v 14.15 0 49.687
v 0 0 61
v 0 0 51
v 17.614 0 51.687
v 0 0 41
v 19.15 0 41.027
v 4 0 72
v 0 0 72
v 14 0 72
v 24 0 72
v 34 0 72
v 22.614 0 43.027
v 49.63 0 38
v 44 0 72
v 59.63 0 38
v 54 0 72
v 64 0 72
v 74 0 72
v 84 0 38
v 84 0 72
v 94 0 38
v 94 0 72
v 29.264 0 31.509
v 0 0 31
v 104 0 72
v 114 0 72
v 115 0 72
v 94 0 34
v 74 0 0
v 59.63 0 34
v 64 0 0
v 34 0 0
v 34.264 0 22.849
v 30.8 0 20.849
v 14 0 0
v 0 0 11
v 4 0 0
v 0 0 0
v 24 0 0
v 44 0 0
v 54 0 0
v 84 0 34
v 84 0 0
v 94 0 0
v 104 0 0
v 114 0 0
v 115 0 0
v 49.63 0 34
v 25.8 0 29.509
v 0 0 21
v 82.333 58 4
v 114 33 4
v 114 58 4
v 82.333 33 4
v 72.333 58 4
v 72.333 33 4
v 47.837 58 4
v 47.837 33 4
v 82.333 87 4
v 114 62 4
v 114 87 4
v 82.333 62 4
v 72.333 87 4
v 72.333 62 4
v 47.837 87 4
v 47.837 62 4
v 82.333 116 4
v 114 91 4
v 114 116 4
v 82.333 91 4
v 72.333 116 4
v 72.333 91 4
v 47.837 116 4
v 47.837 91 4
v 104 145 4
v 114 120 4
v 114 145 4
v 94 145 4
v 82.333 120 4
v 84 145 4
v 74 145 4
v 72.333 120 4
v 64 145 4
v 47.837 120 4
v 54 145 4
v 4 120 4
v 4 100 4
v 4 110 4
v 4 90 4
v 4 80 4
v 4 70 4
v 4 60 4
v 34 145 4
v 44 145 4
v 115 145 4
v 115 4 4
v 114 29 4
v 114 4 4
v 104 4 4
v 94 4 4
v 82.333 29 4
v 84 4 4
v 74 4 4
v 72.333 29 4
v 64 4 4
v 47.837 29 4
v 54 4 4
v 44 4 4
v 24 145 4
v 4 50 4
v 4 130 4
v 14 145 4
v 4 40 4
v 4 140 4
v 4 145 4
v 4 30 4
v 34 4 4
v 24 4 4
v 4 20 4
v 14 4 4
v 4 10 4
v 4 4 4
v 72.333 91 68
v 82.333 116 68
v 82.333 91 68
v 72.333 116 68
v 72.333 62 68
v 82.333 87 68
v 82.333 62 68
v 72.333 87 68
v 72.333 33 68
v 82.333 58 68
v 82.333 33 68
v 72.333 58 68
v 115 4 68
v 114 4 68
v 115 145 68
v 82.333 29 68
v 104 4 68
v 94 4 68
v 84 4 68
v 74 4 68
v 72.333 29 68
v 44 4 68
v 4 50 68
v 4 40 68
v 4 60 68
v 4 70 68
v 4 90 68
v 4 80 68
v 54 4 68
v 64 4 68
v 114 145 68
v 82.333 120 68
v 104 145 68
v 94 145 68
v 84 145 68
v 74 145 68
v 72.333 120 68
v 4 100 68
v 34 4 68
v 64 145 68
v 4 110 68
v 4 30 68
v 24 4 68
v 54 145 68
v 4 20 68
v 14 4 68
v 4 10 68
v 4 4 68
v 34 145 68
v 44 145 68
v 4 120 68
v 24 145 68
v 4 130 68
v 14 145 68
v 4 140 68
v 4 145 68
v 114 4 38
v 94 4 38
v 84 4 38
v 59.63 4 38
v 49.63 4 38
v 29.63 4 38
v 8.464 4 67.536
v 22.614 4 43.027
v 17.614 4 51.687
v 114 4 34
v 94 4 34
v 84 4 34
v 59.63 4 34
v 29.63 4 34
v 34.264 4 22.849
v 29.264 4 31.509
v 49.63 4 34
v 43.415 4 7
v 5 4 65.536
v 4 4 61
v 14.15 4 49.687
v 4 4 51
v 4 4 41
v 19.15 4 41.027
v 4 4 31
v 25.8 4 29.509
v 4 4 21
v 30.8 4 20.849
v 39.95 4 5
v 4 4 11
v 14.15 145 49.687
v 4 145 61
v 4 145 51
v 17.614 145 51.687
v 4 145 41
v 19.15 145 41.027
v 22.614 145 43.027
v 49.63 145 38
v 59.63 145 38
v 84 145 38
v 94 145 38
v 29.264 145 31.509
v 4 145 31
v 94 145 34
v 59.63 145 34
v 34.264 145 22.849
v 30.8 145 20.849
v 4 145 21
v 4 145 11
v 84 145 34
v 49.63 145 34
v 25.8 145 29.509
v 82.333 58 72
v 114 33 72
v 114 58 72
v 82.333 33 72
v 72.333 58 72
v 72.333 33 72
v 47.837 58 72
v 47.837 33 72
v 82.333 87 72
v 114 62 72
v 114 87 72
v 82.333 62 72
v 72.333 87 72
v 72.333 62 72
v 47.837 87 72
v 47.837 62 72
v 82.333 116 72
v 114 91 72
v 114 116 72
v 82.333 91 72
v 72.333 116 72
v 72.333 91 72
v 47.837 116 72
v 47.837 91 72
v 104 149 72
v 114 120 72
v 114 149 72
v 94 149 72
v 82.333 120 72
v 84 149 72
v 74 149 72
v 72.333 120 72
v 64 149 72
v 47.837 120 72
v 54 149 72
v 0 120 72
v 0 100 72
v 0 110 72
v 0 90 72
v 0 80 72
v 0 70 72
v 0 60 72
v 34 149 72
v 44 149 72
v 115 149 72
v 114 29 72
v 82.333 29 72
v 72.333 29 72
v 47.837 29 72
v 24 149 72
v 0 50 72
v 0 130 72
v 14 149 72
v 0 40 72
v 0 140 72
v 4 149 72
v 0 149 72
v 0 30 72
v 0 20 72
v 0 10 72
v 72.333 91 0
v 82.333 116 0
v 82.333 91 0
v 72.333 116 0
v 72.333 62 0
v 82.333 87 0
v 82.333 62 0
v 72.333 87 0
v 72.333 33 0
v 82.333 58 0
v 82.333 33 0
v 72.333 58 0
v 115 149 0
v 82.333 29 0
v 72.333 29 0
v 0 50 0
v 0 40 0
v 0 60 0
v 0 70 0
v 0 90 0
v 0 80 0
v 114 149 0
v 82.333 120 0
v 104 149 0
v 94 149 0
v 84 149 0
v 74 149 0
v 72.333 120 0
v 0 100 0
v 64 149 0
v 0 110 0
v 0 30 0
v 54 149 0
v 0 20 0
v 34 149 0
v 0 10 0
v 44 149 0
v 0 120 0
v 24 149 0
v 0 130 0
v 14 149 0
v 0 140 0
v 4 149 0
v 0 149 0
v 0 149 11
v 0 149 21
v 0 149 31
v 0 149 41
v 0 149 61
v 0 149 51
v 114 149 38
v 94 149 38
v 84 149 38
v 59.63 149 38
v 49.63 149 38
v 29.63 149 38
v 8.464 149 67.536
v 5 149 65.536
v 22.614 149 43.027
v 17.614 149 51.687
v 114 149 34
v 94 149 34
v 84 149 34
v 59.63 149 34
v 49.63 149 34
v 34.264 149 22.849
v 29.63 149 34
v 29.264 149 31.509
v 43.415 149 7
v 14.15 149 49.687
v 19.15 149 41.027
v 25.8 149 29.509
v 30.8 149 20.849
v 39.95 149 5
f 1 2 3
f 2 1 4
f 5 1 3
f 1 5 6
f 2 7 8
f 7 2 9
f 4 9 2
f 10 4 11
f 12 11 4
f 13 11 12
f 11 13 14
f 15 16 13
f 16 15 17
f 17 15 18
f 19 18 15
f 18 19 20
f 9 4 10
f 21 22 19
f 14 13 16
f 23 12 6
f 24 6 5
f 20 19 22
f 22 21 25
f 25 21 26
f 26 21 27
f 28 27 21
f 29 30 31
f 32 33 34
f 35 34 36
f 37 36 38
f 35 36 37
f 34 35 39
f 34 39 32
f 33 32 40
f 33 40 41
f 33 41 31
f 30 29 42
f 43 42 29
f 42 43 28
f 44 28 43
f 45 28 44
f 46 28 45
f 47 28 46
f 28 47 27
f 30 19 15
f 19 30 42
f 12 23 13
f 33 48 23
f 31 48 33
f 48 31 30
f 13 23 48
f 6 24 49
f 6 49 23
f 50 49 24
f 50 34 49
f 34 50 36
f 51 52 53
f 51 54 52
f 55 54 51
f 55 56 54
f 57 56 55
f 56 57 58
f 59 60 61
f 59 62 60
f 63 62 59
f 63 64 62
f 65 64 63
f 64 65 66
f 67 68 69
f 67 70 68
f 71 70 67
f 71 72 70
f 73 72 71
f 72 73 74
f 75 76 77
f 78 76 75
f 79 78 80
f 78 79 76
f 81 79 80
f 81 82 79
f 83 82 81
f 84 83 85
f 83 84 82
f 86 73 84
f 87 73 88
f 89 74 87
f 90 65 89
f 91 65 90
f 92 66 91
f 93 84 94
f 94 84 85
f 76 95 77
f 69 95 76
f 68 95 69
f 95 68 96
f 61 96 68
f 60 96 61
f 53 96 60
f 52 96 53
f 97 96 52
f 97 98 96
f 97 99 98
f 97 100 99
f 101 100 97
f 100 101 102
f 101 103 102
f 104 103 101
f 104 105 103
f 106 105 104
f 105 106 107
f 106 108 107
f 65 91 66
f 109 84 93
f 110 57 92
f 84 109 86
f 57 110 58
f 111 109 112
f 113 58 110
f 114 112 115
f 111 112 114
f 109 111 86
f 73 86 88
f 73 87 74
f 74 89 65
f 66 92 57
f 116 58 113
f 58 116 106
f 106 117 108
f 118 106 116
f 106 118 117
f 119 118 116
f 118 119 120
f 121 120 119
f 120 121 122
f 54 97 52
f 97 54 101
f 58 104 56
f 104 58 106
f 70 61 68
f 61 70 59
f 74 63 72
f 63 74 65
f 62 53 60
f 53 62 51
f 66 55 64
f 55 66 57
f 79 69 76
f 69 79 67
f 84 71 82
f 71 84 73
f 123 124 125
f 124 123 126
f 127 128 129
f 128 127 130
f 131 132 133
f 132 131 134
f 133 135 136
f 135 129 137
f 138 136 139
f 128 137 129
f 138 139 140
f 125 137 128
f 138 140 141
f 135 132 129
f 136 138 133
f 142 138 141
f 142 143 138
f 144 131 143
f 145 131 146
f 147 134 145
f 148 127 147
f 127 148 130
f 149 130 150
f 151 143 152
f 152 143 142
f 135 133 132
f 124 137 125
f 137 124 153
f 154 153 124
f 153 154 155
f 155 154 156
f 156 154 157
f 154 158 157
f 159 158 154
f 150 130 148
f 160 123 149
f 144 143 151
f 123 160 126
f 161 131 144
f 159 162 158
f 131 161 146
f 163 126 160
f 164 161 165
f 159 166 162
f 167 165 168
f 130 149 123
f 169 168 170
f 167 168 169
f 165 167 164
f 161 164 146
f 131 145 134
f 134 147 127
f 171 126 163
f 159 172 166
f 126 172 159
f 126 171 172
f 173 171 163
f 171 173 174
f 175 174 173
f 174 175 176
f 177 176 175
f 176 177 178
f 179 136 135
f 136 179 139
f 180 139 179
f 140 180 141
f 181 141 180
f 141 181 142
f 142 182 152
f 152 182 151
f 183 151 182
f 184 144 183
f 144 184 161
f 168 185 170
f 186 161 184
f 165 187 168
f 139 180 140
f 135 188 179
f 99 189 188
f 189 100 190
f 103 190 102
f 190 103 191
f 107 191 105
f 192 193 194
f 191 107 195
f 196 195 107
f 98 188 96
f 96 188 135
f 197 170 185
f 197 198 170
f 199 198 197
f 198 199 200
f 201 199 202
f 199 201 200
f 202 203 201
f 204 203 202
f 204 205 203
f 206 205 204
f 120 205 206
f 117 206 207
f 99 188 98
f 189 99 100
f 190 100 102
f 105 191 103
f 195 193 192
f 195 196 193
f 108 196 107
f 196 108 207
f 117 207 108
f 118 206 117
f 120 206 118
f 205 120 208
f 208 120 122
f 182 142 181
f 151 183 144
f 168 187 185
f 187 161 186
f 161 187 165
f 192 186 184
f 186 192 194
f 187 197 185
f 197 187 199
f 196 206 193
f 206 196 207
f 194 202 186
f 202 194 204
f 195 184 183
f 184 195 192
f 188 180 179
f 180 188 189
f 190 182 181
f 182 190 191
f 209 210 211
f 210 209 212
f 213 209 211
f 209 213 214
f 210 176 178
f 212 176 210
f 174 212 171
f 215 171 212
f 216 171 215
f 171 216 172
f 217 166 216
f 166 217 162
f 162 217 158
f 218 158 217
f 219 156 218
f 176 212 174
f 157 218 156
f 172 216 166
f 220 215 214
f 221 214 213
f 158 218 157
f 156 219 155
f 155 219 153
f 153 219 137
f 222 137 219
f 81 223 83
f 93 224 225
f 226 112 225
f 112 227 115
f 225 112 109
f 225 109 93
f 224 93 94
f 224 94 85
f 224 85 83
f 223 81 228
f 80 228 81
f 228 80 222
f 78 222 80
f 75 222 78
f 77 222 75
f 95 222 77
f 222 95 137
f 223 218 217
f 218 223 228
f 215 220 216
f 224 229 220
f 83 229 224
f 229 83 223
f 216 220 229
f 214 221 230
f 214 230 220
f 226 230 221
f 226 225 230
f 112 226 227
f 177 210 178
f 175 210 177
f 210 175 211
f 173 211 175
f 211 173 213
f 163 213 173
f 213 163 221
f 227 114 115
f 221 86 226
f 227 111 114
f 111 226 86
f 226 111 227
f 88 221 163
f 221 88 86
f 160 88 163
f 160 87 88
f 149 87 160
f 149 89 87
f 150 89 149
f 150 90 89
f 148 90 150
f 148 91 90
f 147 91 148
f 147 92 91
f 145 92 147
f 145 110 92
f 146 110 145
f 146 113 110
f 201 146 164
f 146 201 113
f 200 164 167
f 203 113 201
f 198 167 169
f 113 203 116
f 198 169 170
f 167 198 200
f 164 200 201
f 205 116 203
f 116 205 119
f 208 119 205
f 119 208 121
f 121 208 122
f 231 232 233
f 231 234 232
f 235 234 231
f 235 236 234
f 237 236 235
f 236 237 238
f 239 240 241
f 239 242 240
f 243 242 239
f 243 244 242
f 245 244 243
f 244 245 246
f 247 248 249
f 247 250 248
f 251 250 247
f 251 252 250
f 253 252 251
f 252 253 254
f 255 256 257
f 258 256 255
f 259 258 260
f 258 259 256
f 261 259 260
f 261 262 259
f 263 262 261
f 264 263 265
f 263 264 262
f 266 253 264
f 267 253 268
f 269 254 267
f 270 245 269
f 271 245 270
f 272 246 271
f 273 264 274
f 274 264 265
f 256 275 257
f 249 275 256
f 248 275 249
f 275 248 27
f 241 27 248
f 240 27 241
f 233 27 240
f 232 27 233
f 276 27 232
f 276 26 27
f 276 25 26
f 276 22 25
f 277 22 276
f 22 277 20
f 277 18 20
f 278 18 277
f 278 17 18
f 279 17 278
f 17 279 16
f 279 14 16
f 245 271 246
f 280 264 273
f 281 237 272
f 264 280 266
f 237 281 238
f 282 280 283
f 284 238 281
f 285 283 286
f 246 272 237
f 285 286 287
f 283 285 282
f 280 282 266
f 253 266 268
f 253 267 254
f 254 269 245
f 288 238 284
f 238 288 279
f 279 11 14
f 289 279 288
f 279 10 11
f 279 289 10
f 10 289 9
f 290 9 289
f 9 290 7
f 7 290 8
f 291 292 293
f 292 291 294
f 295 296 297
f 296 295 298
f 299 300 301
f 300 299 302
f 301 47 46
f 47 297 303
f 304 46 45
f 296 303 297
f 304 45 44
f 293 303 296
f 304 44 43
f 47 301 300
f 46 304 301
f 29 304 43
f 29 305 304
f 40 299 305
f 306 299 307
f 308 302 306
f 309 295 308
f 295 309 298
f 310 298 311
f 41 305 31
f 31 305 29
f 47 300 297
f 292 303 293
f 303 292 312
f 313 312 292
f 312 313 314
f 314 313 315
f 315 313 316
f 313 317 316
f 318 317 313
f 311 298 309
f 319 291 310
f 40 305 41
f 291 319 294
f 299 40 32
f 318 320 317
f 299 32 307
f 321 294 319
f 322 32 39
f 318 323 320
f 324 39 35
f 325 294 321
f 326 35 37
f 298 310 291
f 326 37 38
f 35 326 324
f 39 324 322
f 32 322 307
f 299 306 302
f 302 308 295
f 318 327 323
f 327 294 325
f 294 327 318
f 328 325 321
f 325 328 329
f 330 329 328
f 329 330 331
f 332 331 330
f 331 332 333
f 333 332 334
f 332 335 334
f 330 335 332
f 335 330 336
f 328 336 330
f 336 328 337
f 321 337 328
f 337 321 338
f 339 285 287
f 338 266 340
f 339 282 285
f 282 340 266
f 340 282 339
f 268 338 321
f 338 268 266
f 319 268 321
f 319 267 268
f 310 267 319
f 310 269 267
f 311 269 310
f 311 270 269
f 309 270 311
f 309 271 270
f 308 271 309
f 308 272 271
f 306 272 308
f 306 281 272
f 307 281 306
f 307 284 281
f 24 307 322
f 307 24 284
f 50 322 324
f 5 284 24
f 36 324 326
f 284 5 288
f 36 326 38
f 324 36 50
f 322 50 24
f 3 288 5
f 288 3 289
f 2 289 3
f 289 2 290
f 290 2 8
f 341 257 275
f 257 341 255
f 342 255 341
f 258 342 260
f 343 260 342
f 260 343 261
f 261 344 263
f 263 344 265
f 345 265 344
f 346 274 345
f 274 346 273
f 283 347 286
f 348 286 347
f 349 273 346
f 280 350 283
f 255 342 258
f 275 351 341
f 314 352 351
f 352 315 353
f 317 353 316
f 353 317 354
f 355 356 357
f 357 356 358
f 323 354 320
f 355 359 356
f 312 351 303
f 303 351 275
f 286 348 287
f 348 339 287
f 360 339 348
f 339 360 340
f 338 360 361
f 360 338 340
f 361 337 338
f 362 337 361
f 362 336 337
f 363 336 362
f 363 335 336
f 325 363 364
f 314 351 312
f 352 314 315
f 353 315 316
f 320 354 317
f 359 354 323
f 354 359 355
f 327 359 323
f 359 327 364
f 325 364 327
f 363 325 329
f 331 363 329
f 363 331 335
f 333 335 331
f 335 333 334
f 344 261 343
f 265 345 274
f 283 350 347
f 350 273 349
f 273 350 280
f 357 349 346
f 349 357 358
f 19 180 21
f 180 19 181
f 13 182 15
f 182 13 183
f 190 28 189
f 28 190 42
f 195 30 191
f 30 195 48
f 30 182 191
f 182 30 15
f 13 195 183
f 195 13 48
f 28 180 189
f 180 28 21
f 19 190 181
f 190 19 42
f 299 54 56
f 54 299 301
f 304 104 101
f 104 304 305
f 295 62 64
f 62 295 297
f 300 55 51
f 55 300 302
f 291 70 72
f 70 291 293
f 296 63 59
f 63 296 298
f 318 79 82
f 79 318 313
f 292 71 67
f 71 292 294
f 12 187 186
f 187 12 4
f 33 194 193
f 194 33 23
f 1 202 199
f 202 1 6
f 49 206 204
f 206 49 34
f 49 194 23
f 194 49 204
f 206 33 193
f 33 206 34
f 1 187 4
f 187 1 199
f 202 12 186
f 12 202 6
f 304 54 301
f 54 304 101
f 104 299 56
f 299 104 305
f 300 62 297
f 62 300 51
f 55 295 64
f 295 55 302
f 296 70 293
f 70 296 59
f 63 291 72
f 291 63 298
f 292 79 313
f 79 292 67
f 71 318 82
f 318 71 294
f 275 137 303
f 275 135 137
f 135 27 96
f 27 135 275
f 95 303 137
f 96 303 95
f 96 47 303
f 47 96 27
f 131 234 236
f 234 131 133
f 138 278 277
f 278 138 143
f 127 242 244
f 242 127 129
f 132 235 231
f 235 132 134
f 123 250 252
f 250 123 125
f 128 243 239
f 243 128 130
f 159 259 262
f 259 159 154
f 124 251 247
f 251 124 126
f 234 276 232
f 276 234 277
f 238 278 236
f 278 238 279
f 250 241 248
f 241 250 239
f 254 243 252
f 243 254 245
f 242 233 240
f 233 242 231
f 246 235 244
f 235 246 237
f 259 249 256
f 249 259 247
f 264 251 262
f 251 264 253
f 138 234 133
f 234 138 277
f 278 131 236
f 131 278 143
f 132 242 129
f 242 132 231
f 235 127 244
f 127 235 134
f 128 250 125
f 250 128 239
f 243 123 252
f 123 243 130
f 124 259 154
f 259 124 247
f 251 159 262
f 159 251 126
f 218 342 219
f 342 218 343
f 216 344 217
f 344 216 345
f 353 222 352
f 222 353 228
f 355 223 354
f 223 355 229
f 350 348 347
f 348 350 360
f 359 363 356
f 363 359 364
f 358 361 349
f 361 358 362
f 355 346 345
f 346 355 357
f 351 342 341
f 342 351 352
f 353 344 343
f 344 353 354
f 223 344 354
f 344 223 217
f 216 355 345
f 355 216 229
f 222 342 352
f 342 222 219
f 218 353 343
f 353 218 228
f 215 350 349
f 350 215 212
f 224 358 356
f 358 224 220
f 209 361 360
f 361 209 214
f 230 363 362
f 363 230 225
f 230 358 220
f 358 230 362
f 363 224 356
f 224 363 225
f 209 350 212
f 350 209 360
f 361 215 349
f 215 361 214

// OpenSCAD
// file: crenel.scad
include <./dimensions.scad>

margin = 2;

module crenel(repetitions, size = 10) {
  for(i=[1:repetitions]) {
    translate([2 * size * (i -1), -margin, -margin])
    cube([size, $material_thickness + margin, $material_thickness + 2 * margin]);
  }
}
// file: box-inset.scad
include <./dimensions.scad>

// inside-slant offset ->
offset = $material_thickness + ($height_gap + $material_thickness) / tan (90-$slant_angle) + 2;
margin = 5;

insideWidth = $horizontalPlacements * $thick_gap + ($horizontalPlacements - 1) * $material_thickness;

module horizontalPlank(height) {
  offsetted_height = height - offset;
  difference () {
    union() {
      //base
      cube([offsetted_height, insideWidth, $material_thickness]);
      // first set of wings
      translate([20, - $material_thickness, 0])
        cube([10, insideWidth + 2 * $material_thickness, $material_thickness]);
      // second set of wings
      translate([offsetted_height - 30, - $material_thickness, 0])
        cube([10, insideWidth + 2 * $material_thickness, $material_thickness]);
    }
    // notches
    for(i=[0:($horizontalPlacements - 2)]) {
      horizontalShift = (i + 1) * $thick_gap + (i *  $material_thickness);
      if (i % 2 == 0){
        translate([- margin, horizontalShift, - margin ])
        cube([offsetted_height / 2 + margin, $material_thickness, 2*margin +  $material_thickness]);
      } else {
        translate([offsetted_height / 2, horizontalShift, - margin])
        cube([offsetted_height / 2 + margin, $material_thickness, 2*margin + $material_thickness]);
      }
    }
  }
}

module insideSlant() {
  slantHeight = (2 * $height_gap + $material_thickness) / sin(90 - $slant_angle) - $material_thickness;
  union() {
    cube([$material_thickness, insideWidth, slantHeight]);
    translate([0, - $material_thickness, (slantHeight / 3) - 5])
    cube([$material_thickness, insideWidth + 2 * $material_thickness, 10]);
    translate([0, - $material_thickness, 2 * (slantHeight / 3) - 5])
    cube([$material_thickness, insideWidth + 2 * $material_thickness, 10]);
  }
}

module verticalSeparator(height, front_notch = true) {
  offsetted_height = height - offset;
  separatorWidth = 2 * $height_gap + $material_thickness;

  base = 4 + margin;
  bottomOffset = base + (separatorWidth + 2 * margin) / tan(90-$slant_angle);

  // wedge cutout
  wedgePoints = [
    [0, 0, separatorWidth + 2 * margin], // 0
    [base, 0, separatorWidth + 2 * margin], // 1
    [bottomOffset, 0, 0], // 2
    [0, 0, 0], // 3
    [0, $material_thickness + 2 * margin, separatorWidth + 2 * margin], // 4
    [base, $material_thickness + 2 * margin, separatorWidth + 2 * margin], // 5
    [bottomOffset, $material_thickness + 2 * margin, 0], // 6
    [0, $material_thickness + 2 * margin, 0] // 7
  ];
  wedgeFaces = [
    [4, 5, 1, 0], // top
    [0, 1, 2, 3], // front
    [5, 6, 2, 1], // side
    [7, 6, 5, 4], // back
    [6, 7, 3, 2], // bottom
    [7, 4, 0, 3] // other side
  ];


  difference() {
    union() {
      cube([height, $material_thickness, separatorWidth]);
      translate([2 * height / 3 - 5, 0, - $material_thickness])
        cube([10, $material_thickness, separatorWidth + 2 * $material_thickness]);
    }
    translate([-margin, -margin, -margin])
      polyhedron(wedgePoints, wedgeFaces);
    if (front_notch) {
      translate([offset + offsetted_height / 2, -margin, $height_gap])
        cube([offsetted_height / 2 + margin, $material_thickness + 2 * margin, $material_thickness]);
    } else {
      translate([offset - margin, -margin, $height_gap])
        cube([offsetted_height / 2 + margin, $material_thickness + 2 * margin, $material_thickness]);
    }
  }
}

module boxInset(height = $insideHeight) {
  translate([offset, 0, 30])
    horizontalPlank(height);

  translate([($height_gap * 2 + $material_thickness)/ tan(90 - $slant_angle) - 0.25 * $material_thickness, 0, 0.25 * $material_thickness])
  rotate([0, -$slant_angle, 0])
    insideSlant();

  for(i=[0:($horizontalPlacements - 2)]) {
    horizontalShift = [0, (i + 1) * $thick_gap + i * $material_thickness, 0];
    if(i % 2 == 0) {
      color("blue")
      translate(horizontalShift)
      verticalSeparator(height, true);
    } else {
      color("green")
      translate(horizontalShift)
      verticalSeparator(height, false);
    }
  }
}

boxInset();
// file: dimensions.scad
/*
 * This file regroup all the common dimensions, angles, and repetitions
 */

/* harmonica dimensions
 *    ______________
 *   /             /|
 *  /_____________/ | <- height_gap
 *  |             | |
 *  |             | /
 *  |_____________|/ <- thick_gap
 *    ^ length_gap
 */
$thick_gap = 25;
$height_gap = 30;
$length_gap = 105;

// base material thickness, this represent the thickness of the most commonly used material.
$material_thickness = 4;
// dictate how slanted should the inside slant be: if put to 0 then it's just a vertical wall (pointless), if put to 90° then it's a horizontal slant (also pointless)
// 20° was not slanted enough, 30° should be ok.
$slant_angle = 30;


// how far should the inset goes?
$insideHeight = 110;
// how much futher should the ouset cover?
$outsetMargin = 5;

// how many harmonica do you want to store on a given row?
$horizontalPlacements = 5;
// NOTE: there are 2 rows for now and the model isn't ready to change that part easily
// main file
/*
 * This file models the outwards part of the case:
 *
 *    ______________________________
 *   /                             /|
 *  /                             / |
 * /_____________________________/  |
 * |                             |  |
 * |                             |  | <- short side
 * |                             |  |
 * |                             |  |
 * |                             |  |
 * |                          <----------- long side
 * |                             |  |
 * |                             |  /
 * |                             | /
 * |_____________________________|/
 *       ^ bottom
 *
 *
 * *short side*: has notches for inside slant's wings and the horizontal plank's short side wings
 * *long side*: has notches for veritcal separators' wings
 * *bottom*: no notches
 */
include <./dimensions.scad>
use <./box-inset.scad>
use <./crenel.scad>

width = $horizontalPlacements * $thick_gap + ($horizontalPlacements + 1) * $material_thickness;
depth = 2 * $height_gap + 3 * $material_thickness;

margin = 2;


module bottom() {
  module sideCrenel() {
    translate([2 * margin, 0, (depth - 50) / 2 + 10])
    rotate([0,-90, 0])
      crenel(2);
    translate([-margin, -  margin, 0]){
      translate([0, 0, (depth - 50) / 2 - 20 ])
        cube([$material_thickness + 2 * margin, $material_thickness +  margin, 20]);
      translate([0, 0, (depth) - ((depth - 50) / 2)  ])
        cube([$material_thickness + 2 * margin, $material_thickness +  margin, 20]);
    }
  };
  difference() {
    cube([$material_thickness, width, depth]);
    rotate([90, 0, 90])
      crenel(10);
    translate([0, 0, depth - margin])
    rotate([90, 0, 90])
      crenel(10);
    sideCrenel();
    translate([0, width - margin, 0])
    sideCrenel();
  }
}

module long_side(height) {
  difference() {
    cube([height, width, $material_thickness]);
    //long-side <-> short side 
    translate([- 10 + $material_thickness, 0, 0])
      crenel(7);
    translate([- 10 + $material_thickness, width - margin, 0])
      crenel(7);
    // long-side <-> bottom
    translate([margin, -10, 0])
    rotate([0, 0, 90])
      crenel(10);
    translate([$material_thickness, $material_thickness, $material_thickness])
      boxInset();
  }
}

module short_side(height) {
  difference() {
    cube([height, $material_thickness, depth]);
    // short-side <-> long-side
    translate([$material_thickness, 0, margin])
    rotate([-90,0, 0])
      crenel(6);
    translate([$material_thickness, 2 * margin, depth - margin])
    rotate([90,0, 0])
      crenel(6);
    // short-side <-> bottom
    translate([0, 0, (depth - 50) / 2])
    rotate([-90,-90, 0])
      crenel(3);
    translate([$material_thickness, $material_thickness, $material_thickness])
      boxInset();
  }
}

module boxOutset(insetHeight = $insideHeight, outsetMargin = $outsetMargin) {
  height = insetHeight + outsetMargin;

  color("red")
  bottom();

  color("green")
  long_side(height);
  color("blue")
  translate([0,0, depth - $material_thickness])
  long_side(height);

  color("violet")
  short_side(height);
  color("yellow")
  translate([0,width - $material_thickness,0])
  short_side(height);
}


boxOutset();
